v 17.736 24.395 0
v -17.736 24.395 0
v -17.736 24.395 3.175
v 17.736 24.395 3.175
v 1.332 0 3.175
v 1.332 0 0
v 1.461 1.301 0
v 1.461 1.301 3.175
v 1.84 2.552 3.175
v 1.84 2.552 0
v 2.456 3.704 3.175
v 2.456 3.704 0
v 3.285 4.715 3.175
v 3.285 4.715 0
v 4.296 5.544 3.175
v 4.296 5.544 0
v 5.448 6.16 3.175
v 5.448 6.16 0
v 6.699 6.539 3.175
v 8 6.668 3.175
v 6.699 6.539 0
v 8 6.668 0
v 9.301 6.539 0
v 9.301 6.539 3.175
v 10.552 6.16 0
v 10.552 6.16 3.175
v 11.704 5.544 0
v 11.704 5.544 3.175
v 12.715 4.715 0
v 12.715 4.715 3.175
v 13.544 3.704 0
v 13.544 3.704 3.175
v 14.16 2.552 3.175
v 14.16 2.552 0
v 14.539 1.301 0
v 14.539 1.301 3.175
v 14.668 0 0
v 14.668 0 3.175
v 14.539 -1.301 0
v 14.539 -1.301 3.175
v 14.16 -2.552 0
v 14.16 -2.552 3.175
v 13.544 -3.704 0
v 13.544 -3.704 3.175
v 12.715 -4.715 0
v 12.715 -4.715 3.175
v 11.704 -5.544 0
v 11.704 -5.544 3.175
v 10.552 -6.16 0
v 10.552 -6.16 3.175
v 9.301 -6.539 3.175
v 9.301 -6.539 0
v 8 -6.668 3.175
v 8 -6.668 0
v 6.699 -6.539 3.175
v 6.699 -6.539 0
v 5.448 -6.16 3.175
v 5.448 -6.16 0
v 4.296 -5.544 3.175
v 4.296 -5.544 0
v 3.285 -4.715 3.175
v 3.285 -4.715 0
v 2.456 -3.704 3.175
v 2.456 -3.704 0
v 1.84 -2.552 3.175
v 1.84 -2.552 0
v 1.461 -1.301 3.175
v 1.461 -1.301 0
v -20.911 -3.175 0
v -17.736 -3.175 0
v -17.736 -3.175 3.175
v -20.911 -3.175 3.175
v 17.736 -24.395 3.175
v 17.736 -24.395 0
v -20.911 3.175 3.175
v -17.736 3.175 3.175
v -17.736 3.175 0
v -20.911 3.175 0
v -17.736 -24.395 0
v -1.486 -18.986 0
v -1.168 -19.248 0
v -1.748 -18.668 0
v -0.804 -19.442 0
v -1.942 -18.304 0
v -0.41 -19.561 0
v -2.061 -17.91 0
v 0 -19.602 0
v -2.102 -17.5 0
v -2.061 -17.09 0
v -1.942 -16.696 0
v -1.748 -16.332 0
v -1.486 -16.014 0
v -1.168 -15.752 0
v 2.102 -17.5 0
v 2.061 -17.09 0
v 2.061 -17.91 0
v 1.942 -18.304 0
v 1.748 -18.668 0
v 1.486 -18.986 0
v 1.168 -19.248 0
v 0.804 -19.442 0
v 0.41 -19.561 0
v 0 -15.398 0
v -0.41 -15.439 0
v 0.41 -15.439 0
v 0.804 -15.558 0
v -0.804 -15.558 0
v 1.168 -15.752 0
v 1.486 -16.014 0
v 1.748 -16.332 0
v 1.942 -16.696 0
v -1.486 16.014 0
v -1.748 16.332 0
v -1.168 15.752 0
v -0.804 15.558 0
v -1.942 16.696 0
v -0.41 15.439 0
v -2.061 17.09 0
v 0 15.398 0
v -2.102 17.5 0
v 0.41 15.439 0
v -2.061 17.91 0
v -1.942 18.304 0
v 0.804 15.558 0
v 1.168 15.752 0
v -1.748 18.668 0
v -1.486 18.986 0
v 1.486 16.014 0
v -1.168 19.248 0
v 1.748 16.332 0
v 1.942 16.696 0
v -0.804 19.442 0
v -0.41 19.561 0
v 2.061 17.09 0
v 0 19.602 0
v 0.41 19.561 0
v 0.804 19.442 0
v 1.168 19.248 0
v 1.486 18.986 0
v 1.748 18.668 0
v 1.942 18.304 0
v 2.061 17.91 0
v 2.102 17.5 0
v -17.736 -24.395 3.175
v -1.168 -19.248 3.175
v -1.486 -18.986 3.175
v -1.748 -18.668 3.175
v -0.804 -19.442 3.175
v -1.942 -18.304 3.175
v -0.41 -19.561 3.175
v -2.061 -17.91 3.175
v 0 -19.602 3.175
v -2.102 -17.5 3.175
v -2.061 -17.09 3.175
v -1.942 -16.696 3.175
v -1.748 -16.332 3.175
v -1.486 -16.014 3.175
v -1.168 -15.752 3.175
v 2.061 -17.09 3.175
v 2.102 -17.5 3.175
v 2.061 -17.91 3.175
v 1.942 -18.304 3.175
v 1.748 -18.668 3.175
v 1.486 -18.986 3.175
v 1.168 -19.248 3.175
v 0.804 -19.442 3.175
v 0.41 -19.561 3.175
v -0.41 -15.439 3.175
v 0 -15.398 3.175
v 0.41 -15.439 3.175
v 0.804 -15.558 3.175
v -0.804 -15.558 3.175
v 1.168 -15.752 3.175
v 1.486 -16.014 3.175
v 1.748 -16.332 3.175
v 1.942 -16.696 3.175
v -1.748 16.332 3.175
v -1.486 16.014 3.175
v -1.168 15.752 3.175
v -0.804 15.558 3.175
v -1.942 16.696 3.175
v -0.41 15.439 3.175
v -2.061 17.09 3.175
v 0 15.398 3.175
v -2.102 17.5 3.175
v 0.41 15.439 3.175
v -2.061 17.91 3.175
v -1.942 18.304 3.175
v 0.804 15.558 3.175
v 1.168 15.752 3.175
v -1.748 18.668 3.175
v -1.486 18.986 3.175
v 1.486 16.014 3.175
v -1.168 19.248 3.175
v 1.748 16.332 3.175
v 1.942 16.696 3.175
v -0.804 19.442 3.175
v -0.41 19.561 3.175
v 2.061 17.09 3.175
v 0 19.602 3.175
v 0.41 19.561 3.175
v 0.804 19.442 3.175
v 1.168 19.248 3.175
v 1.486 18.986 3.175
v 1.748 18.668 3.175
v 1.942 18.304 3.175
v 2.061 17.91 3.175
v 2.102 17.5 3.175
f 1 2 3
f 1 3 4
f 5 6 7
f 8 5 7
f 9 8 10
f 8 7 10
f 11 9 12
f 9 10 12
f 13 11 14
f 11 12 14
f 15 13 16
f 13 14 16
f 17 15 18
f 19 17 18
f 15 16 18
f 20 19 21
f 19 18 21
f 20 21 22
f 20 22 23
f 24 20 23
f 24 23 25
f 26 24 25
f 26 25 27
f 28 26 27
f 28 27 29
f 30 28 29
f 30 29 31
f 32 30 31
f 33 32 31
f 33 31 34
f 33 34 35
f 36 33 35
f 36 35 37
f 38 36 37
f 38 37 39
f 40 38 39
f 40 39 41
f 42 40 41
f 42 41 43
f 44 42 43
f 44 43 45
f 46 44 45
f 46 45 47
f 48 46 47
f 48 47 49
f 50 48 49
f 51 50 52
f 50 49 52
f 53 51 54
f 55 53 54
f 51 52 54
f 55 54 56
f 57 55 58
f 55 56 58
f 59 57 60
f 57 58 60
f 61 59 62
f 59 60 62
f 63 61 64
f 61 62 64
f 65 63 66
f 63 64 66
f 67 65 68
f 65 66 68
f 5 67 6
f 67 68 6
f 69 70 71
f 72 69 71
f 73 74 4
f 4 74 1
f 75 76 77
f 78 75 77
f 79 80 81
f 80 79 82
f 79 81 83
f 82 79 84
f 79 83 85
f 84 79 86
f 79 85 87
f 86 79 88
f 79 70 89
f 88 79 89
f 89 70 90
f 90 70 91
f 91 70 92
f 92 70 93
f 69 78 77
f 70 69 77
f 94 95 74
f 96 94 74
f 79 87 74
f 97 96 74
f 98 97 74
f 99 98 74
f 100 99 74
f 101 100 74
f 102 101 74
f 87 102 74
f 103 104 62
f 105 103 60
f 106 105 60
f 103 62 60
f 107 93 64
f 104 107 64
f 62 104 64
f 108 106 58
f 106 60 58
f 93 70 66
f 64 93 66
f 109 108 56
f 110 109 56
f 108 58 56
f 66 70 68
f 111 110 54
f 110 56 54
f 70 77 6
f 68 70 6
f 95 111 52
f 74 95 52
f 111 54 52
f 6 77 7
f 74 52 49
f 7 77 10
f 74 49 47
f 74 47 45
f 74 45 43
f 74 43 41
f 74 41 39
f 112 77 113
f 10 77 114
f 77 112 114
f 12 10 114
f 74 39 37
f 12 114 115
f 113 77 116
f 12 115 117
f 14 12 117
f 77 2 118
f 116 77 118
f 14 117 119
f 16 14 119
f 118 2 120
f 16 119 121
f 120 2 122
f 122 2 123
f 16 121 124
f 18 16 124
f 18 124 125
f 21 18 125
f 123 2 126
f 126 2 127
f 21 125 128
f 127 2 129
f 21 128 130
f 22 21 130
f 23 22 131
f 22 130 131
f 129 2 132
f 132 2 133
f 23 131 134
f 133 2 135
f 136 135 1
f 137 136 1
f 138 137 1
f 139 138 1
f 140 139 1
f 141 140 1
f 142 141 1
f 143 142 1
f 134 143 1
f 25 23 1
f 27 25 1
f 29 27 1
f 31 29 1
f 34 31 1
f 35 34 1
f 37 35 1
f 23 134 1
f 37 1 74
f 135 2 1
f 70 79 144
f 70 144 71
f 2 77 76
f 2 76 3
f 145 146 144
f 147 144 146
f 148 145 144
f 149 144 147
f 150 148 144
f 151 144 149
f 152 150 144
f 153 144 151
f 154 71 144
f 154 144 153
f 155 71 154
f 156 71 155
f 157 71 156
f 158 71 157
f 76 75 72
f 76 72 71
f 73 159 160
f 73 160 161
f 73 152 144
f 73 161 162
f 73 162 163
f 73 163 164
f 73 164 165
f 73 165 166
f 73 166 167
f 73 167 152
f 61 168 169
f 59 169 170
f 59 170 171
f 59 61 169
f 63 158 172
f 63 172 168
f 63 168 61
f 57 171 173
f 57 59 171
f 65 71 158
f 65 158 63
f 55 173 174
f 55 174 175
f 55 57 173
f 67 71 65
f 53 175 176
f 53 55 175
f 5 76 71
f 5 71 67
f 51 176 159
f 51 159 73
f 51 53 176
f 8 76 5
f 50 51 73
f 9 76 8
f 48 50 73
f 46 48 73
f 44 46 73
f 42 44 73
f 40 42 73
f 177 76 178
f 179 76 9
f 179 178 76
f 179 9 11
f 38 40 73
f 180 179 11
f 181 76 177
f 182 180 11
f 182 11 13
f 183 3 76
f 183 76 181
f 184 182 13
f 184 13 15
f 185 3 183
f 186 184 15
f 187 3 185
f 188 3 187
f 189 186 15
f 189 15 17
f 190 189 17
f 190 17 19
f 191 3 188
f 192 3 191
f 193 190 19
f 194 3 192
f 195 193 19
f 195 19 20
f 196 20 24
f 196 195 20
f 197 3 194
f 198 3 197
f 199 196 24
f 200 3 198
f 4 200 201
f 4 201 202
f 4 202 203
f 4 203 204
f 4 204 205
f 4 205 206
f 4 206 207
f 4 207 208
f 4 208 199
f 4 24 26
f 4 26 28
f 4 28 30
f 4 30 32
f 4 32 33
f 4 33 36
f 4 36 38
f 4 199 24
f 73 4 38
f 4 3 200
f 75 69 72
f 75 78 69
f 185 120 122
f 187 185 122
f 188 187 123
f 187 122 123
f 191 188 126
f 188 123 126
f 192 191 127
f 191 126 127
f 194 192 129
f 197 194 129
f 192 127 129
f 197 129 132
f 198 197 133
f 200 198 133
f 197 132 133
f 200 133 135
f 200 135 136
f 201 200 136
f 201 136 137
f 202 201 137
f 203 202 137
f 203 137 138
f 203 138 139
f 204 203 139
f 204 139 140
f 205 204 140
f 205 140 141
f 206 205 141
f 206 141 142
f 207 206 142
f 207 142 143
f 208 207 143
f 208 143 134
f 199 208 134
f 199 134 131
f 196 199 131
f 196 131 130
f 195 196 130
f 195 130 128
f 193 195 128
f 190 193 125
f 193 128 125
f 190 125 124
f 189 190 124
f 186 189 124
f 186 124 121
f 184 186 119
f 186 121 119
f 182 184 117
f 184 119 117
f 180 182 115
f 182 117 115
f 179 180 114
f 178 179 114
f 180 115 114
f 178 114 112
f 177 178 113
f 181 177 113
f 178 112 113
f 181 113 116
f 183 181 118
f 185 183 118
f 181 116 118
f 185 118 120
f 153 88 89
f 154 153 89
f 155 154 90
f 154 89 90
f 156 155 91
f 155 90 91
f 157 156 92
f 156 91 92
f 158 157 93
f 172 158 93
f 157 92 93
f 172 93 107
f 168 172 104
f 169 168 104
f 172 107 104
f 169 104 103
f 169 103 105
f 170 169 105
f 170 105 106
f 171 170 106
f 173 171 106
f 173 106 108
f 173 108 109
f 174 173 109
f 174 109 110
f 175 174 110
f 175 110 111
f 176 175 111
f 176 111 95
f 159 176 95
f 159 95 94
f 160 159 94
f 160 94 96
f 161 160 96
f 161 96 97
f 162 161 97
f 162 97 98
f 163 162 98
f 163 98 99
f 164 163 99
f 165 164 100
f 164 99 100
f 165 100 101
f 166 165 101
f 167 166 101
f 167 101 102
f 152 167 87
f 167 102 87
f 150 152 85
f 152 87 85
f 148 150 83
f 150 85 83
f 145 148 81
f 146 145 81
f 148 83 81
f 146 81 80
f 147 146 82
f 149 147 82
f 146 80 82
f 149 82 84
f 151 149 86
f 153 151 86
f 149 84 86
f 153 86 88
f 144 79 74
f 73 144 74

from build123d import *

# Parameters (mm, degrees)
SKETCH1_W           = 35.47213452
SKETCH1_H           = 48.789667988
BOSS_EXTRUDE1_DEPTH = 3.175
SKETCH2_R           = 2.10185
SKETCH2_R_2         = 6.6675
CUT_EXTRUDE1_DEPTH  = 31.327489716
BOSS_EXTRUDE2_DEPTH = 3.175


with BuildPart() as part:
    # Sketch1 → Boss-Extrude1 (new body)
    with BuildSketch(Plane.XY):
        Rectangle(SKETCH1_W, SKETCH1_H)
    extrude(amount=BOSS_EXTRUDE1_DEPTH)

    # Sketch2 → Cut-Extrude1 (cut, through all)
    with BuildSketch(Plane(origin=(0, 0, 0), x_dir=(-1, 0, 0), z_dir=(0, 0, -1))):
        with Locations((0, 17.5)):
            Circle(SKETCH2_R)
        with Locations((0, -17.5)):
            Circle(SKETCH2_R)
        with Locations((-8, 0)):
            Circle(SKETCH2_R_2)
    extrude(amount=-CUT_EXTRUDE1_DEPTH, mode=Mode.SUBTRACT)

    # Sketch3 → Boss-Extrude2 (add)
    with BuildSketch(Plane.ZY.offset(17.73606726)):
        Polygon((0, 0), (0, -3.175), (3.175, -3.175), (3.175, 3.175), (0, 3.175), align=None)
    extrude(amount=BOSS_EXTRUDE2_DEPTH)


solid = part.part
